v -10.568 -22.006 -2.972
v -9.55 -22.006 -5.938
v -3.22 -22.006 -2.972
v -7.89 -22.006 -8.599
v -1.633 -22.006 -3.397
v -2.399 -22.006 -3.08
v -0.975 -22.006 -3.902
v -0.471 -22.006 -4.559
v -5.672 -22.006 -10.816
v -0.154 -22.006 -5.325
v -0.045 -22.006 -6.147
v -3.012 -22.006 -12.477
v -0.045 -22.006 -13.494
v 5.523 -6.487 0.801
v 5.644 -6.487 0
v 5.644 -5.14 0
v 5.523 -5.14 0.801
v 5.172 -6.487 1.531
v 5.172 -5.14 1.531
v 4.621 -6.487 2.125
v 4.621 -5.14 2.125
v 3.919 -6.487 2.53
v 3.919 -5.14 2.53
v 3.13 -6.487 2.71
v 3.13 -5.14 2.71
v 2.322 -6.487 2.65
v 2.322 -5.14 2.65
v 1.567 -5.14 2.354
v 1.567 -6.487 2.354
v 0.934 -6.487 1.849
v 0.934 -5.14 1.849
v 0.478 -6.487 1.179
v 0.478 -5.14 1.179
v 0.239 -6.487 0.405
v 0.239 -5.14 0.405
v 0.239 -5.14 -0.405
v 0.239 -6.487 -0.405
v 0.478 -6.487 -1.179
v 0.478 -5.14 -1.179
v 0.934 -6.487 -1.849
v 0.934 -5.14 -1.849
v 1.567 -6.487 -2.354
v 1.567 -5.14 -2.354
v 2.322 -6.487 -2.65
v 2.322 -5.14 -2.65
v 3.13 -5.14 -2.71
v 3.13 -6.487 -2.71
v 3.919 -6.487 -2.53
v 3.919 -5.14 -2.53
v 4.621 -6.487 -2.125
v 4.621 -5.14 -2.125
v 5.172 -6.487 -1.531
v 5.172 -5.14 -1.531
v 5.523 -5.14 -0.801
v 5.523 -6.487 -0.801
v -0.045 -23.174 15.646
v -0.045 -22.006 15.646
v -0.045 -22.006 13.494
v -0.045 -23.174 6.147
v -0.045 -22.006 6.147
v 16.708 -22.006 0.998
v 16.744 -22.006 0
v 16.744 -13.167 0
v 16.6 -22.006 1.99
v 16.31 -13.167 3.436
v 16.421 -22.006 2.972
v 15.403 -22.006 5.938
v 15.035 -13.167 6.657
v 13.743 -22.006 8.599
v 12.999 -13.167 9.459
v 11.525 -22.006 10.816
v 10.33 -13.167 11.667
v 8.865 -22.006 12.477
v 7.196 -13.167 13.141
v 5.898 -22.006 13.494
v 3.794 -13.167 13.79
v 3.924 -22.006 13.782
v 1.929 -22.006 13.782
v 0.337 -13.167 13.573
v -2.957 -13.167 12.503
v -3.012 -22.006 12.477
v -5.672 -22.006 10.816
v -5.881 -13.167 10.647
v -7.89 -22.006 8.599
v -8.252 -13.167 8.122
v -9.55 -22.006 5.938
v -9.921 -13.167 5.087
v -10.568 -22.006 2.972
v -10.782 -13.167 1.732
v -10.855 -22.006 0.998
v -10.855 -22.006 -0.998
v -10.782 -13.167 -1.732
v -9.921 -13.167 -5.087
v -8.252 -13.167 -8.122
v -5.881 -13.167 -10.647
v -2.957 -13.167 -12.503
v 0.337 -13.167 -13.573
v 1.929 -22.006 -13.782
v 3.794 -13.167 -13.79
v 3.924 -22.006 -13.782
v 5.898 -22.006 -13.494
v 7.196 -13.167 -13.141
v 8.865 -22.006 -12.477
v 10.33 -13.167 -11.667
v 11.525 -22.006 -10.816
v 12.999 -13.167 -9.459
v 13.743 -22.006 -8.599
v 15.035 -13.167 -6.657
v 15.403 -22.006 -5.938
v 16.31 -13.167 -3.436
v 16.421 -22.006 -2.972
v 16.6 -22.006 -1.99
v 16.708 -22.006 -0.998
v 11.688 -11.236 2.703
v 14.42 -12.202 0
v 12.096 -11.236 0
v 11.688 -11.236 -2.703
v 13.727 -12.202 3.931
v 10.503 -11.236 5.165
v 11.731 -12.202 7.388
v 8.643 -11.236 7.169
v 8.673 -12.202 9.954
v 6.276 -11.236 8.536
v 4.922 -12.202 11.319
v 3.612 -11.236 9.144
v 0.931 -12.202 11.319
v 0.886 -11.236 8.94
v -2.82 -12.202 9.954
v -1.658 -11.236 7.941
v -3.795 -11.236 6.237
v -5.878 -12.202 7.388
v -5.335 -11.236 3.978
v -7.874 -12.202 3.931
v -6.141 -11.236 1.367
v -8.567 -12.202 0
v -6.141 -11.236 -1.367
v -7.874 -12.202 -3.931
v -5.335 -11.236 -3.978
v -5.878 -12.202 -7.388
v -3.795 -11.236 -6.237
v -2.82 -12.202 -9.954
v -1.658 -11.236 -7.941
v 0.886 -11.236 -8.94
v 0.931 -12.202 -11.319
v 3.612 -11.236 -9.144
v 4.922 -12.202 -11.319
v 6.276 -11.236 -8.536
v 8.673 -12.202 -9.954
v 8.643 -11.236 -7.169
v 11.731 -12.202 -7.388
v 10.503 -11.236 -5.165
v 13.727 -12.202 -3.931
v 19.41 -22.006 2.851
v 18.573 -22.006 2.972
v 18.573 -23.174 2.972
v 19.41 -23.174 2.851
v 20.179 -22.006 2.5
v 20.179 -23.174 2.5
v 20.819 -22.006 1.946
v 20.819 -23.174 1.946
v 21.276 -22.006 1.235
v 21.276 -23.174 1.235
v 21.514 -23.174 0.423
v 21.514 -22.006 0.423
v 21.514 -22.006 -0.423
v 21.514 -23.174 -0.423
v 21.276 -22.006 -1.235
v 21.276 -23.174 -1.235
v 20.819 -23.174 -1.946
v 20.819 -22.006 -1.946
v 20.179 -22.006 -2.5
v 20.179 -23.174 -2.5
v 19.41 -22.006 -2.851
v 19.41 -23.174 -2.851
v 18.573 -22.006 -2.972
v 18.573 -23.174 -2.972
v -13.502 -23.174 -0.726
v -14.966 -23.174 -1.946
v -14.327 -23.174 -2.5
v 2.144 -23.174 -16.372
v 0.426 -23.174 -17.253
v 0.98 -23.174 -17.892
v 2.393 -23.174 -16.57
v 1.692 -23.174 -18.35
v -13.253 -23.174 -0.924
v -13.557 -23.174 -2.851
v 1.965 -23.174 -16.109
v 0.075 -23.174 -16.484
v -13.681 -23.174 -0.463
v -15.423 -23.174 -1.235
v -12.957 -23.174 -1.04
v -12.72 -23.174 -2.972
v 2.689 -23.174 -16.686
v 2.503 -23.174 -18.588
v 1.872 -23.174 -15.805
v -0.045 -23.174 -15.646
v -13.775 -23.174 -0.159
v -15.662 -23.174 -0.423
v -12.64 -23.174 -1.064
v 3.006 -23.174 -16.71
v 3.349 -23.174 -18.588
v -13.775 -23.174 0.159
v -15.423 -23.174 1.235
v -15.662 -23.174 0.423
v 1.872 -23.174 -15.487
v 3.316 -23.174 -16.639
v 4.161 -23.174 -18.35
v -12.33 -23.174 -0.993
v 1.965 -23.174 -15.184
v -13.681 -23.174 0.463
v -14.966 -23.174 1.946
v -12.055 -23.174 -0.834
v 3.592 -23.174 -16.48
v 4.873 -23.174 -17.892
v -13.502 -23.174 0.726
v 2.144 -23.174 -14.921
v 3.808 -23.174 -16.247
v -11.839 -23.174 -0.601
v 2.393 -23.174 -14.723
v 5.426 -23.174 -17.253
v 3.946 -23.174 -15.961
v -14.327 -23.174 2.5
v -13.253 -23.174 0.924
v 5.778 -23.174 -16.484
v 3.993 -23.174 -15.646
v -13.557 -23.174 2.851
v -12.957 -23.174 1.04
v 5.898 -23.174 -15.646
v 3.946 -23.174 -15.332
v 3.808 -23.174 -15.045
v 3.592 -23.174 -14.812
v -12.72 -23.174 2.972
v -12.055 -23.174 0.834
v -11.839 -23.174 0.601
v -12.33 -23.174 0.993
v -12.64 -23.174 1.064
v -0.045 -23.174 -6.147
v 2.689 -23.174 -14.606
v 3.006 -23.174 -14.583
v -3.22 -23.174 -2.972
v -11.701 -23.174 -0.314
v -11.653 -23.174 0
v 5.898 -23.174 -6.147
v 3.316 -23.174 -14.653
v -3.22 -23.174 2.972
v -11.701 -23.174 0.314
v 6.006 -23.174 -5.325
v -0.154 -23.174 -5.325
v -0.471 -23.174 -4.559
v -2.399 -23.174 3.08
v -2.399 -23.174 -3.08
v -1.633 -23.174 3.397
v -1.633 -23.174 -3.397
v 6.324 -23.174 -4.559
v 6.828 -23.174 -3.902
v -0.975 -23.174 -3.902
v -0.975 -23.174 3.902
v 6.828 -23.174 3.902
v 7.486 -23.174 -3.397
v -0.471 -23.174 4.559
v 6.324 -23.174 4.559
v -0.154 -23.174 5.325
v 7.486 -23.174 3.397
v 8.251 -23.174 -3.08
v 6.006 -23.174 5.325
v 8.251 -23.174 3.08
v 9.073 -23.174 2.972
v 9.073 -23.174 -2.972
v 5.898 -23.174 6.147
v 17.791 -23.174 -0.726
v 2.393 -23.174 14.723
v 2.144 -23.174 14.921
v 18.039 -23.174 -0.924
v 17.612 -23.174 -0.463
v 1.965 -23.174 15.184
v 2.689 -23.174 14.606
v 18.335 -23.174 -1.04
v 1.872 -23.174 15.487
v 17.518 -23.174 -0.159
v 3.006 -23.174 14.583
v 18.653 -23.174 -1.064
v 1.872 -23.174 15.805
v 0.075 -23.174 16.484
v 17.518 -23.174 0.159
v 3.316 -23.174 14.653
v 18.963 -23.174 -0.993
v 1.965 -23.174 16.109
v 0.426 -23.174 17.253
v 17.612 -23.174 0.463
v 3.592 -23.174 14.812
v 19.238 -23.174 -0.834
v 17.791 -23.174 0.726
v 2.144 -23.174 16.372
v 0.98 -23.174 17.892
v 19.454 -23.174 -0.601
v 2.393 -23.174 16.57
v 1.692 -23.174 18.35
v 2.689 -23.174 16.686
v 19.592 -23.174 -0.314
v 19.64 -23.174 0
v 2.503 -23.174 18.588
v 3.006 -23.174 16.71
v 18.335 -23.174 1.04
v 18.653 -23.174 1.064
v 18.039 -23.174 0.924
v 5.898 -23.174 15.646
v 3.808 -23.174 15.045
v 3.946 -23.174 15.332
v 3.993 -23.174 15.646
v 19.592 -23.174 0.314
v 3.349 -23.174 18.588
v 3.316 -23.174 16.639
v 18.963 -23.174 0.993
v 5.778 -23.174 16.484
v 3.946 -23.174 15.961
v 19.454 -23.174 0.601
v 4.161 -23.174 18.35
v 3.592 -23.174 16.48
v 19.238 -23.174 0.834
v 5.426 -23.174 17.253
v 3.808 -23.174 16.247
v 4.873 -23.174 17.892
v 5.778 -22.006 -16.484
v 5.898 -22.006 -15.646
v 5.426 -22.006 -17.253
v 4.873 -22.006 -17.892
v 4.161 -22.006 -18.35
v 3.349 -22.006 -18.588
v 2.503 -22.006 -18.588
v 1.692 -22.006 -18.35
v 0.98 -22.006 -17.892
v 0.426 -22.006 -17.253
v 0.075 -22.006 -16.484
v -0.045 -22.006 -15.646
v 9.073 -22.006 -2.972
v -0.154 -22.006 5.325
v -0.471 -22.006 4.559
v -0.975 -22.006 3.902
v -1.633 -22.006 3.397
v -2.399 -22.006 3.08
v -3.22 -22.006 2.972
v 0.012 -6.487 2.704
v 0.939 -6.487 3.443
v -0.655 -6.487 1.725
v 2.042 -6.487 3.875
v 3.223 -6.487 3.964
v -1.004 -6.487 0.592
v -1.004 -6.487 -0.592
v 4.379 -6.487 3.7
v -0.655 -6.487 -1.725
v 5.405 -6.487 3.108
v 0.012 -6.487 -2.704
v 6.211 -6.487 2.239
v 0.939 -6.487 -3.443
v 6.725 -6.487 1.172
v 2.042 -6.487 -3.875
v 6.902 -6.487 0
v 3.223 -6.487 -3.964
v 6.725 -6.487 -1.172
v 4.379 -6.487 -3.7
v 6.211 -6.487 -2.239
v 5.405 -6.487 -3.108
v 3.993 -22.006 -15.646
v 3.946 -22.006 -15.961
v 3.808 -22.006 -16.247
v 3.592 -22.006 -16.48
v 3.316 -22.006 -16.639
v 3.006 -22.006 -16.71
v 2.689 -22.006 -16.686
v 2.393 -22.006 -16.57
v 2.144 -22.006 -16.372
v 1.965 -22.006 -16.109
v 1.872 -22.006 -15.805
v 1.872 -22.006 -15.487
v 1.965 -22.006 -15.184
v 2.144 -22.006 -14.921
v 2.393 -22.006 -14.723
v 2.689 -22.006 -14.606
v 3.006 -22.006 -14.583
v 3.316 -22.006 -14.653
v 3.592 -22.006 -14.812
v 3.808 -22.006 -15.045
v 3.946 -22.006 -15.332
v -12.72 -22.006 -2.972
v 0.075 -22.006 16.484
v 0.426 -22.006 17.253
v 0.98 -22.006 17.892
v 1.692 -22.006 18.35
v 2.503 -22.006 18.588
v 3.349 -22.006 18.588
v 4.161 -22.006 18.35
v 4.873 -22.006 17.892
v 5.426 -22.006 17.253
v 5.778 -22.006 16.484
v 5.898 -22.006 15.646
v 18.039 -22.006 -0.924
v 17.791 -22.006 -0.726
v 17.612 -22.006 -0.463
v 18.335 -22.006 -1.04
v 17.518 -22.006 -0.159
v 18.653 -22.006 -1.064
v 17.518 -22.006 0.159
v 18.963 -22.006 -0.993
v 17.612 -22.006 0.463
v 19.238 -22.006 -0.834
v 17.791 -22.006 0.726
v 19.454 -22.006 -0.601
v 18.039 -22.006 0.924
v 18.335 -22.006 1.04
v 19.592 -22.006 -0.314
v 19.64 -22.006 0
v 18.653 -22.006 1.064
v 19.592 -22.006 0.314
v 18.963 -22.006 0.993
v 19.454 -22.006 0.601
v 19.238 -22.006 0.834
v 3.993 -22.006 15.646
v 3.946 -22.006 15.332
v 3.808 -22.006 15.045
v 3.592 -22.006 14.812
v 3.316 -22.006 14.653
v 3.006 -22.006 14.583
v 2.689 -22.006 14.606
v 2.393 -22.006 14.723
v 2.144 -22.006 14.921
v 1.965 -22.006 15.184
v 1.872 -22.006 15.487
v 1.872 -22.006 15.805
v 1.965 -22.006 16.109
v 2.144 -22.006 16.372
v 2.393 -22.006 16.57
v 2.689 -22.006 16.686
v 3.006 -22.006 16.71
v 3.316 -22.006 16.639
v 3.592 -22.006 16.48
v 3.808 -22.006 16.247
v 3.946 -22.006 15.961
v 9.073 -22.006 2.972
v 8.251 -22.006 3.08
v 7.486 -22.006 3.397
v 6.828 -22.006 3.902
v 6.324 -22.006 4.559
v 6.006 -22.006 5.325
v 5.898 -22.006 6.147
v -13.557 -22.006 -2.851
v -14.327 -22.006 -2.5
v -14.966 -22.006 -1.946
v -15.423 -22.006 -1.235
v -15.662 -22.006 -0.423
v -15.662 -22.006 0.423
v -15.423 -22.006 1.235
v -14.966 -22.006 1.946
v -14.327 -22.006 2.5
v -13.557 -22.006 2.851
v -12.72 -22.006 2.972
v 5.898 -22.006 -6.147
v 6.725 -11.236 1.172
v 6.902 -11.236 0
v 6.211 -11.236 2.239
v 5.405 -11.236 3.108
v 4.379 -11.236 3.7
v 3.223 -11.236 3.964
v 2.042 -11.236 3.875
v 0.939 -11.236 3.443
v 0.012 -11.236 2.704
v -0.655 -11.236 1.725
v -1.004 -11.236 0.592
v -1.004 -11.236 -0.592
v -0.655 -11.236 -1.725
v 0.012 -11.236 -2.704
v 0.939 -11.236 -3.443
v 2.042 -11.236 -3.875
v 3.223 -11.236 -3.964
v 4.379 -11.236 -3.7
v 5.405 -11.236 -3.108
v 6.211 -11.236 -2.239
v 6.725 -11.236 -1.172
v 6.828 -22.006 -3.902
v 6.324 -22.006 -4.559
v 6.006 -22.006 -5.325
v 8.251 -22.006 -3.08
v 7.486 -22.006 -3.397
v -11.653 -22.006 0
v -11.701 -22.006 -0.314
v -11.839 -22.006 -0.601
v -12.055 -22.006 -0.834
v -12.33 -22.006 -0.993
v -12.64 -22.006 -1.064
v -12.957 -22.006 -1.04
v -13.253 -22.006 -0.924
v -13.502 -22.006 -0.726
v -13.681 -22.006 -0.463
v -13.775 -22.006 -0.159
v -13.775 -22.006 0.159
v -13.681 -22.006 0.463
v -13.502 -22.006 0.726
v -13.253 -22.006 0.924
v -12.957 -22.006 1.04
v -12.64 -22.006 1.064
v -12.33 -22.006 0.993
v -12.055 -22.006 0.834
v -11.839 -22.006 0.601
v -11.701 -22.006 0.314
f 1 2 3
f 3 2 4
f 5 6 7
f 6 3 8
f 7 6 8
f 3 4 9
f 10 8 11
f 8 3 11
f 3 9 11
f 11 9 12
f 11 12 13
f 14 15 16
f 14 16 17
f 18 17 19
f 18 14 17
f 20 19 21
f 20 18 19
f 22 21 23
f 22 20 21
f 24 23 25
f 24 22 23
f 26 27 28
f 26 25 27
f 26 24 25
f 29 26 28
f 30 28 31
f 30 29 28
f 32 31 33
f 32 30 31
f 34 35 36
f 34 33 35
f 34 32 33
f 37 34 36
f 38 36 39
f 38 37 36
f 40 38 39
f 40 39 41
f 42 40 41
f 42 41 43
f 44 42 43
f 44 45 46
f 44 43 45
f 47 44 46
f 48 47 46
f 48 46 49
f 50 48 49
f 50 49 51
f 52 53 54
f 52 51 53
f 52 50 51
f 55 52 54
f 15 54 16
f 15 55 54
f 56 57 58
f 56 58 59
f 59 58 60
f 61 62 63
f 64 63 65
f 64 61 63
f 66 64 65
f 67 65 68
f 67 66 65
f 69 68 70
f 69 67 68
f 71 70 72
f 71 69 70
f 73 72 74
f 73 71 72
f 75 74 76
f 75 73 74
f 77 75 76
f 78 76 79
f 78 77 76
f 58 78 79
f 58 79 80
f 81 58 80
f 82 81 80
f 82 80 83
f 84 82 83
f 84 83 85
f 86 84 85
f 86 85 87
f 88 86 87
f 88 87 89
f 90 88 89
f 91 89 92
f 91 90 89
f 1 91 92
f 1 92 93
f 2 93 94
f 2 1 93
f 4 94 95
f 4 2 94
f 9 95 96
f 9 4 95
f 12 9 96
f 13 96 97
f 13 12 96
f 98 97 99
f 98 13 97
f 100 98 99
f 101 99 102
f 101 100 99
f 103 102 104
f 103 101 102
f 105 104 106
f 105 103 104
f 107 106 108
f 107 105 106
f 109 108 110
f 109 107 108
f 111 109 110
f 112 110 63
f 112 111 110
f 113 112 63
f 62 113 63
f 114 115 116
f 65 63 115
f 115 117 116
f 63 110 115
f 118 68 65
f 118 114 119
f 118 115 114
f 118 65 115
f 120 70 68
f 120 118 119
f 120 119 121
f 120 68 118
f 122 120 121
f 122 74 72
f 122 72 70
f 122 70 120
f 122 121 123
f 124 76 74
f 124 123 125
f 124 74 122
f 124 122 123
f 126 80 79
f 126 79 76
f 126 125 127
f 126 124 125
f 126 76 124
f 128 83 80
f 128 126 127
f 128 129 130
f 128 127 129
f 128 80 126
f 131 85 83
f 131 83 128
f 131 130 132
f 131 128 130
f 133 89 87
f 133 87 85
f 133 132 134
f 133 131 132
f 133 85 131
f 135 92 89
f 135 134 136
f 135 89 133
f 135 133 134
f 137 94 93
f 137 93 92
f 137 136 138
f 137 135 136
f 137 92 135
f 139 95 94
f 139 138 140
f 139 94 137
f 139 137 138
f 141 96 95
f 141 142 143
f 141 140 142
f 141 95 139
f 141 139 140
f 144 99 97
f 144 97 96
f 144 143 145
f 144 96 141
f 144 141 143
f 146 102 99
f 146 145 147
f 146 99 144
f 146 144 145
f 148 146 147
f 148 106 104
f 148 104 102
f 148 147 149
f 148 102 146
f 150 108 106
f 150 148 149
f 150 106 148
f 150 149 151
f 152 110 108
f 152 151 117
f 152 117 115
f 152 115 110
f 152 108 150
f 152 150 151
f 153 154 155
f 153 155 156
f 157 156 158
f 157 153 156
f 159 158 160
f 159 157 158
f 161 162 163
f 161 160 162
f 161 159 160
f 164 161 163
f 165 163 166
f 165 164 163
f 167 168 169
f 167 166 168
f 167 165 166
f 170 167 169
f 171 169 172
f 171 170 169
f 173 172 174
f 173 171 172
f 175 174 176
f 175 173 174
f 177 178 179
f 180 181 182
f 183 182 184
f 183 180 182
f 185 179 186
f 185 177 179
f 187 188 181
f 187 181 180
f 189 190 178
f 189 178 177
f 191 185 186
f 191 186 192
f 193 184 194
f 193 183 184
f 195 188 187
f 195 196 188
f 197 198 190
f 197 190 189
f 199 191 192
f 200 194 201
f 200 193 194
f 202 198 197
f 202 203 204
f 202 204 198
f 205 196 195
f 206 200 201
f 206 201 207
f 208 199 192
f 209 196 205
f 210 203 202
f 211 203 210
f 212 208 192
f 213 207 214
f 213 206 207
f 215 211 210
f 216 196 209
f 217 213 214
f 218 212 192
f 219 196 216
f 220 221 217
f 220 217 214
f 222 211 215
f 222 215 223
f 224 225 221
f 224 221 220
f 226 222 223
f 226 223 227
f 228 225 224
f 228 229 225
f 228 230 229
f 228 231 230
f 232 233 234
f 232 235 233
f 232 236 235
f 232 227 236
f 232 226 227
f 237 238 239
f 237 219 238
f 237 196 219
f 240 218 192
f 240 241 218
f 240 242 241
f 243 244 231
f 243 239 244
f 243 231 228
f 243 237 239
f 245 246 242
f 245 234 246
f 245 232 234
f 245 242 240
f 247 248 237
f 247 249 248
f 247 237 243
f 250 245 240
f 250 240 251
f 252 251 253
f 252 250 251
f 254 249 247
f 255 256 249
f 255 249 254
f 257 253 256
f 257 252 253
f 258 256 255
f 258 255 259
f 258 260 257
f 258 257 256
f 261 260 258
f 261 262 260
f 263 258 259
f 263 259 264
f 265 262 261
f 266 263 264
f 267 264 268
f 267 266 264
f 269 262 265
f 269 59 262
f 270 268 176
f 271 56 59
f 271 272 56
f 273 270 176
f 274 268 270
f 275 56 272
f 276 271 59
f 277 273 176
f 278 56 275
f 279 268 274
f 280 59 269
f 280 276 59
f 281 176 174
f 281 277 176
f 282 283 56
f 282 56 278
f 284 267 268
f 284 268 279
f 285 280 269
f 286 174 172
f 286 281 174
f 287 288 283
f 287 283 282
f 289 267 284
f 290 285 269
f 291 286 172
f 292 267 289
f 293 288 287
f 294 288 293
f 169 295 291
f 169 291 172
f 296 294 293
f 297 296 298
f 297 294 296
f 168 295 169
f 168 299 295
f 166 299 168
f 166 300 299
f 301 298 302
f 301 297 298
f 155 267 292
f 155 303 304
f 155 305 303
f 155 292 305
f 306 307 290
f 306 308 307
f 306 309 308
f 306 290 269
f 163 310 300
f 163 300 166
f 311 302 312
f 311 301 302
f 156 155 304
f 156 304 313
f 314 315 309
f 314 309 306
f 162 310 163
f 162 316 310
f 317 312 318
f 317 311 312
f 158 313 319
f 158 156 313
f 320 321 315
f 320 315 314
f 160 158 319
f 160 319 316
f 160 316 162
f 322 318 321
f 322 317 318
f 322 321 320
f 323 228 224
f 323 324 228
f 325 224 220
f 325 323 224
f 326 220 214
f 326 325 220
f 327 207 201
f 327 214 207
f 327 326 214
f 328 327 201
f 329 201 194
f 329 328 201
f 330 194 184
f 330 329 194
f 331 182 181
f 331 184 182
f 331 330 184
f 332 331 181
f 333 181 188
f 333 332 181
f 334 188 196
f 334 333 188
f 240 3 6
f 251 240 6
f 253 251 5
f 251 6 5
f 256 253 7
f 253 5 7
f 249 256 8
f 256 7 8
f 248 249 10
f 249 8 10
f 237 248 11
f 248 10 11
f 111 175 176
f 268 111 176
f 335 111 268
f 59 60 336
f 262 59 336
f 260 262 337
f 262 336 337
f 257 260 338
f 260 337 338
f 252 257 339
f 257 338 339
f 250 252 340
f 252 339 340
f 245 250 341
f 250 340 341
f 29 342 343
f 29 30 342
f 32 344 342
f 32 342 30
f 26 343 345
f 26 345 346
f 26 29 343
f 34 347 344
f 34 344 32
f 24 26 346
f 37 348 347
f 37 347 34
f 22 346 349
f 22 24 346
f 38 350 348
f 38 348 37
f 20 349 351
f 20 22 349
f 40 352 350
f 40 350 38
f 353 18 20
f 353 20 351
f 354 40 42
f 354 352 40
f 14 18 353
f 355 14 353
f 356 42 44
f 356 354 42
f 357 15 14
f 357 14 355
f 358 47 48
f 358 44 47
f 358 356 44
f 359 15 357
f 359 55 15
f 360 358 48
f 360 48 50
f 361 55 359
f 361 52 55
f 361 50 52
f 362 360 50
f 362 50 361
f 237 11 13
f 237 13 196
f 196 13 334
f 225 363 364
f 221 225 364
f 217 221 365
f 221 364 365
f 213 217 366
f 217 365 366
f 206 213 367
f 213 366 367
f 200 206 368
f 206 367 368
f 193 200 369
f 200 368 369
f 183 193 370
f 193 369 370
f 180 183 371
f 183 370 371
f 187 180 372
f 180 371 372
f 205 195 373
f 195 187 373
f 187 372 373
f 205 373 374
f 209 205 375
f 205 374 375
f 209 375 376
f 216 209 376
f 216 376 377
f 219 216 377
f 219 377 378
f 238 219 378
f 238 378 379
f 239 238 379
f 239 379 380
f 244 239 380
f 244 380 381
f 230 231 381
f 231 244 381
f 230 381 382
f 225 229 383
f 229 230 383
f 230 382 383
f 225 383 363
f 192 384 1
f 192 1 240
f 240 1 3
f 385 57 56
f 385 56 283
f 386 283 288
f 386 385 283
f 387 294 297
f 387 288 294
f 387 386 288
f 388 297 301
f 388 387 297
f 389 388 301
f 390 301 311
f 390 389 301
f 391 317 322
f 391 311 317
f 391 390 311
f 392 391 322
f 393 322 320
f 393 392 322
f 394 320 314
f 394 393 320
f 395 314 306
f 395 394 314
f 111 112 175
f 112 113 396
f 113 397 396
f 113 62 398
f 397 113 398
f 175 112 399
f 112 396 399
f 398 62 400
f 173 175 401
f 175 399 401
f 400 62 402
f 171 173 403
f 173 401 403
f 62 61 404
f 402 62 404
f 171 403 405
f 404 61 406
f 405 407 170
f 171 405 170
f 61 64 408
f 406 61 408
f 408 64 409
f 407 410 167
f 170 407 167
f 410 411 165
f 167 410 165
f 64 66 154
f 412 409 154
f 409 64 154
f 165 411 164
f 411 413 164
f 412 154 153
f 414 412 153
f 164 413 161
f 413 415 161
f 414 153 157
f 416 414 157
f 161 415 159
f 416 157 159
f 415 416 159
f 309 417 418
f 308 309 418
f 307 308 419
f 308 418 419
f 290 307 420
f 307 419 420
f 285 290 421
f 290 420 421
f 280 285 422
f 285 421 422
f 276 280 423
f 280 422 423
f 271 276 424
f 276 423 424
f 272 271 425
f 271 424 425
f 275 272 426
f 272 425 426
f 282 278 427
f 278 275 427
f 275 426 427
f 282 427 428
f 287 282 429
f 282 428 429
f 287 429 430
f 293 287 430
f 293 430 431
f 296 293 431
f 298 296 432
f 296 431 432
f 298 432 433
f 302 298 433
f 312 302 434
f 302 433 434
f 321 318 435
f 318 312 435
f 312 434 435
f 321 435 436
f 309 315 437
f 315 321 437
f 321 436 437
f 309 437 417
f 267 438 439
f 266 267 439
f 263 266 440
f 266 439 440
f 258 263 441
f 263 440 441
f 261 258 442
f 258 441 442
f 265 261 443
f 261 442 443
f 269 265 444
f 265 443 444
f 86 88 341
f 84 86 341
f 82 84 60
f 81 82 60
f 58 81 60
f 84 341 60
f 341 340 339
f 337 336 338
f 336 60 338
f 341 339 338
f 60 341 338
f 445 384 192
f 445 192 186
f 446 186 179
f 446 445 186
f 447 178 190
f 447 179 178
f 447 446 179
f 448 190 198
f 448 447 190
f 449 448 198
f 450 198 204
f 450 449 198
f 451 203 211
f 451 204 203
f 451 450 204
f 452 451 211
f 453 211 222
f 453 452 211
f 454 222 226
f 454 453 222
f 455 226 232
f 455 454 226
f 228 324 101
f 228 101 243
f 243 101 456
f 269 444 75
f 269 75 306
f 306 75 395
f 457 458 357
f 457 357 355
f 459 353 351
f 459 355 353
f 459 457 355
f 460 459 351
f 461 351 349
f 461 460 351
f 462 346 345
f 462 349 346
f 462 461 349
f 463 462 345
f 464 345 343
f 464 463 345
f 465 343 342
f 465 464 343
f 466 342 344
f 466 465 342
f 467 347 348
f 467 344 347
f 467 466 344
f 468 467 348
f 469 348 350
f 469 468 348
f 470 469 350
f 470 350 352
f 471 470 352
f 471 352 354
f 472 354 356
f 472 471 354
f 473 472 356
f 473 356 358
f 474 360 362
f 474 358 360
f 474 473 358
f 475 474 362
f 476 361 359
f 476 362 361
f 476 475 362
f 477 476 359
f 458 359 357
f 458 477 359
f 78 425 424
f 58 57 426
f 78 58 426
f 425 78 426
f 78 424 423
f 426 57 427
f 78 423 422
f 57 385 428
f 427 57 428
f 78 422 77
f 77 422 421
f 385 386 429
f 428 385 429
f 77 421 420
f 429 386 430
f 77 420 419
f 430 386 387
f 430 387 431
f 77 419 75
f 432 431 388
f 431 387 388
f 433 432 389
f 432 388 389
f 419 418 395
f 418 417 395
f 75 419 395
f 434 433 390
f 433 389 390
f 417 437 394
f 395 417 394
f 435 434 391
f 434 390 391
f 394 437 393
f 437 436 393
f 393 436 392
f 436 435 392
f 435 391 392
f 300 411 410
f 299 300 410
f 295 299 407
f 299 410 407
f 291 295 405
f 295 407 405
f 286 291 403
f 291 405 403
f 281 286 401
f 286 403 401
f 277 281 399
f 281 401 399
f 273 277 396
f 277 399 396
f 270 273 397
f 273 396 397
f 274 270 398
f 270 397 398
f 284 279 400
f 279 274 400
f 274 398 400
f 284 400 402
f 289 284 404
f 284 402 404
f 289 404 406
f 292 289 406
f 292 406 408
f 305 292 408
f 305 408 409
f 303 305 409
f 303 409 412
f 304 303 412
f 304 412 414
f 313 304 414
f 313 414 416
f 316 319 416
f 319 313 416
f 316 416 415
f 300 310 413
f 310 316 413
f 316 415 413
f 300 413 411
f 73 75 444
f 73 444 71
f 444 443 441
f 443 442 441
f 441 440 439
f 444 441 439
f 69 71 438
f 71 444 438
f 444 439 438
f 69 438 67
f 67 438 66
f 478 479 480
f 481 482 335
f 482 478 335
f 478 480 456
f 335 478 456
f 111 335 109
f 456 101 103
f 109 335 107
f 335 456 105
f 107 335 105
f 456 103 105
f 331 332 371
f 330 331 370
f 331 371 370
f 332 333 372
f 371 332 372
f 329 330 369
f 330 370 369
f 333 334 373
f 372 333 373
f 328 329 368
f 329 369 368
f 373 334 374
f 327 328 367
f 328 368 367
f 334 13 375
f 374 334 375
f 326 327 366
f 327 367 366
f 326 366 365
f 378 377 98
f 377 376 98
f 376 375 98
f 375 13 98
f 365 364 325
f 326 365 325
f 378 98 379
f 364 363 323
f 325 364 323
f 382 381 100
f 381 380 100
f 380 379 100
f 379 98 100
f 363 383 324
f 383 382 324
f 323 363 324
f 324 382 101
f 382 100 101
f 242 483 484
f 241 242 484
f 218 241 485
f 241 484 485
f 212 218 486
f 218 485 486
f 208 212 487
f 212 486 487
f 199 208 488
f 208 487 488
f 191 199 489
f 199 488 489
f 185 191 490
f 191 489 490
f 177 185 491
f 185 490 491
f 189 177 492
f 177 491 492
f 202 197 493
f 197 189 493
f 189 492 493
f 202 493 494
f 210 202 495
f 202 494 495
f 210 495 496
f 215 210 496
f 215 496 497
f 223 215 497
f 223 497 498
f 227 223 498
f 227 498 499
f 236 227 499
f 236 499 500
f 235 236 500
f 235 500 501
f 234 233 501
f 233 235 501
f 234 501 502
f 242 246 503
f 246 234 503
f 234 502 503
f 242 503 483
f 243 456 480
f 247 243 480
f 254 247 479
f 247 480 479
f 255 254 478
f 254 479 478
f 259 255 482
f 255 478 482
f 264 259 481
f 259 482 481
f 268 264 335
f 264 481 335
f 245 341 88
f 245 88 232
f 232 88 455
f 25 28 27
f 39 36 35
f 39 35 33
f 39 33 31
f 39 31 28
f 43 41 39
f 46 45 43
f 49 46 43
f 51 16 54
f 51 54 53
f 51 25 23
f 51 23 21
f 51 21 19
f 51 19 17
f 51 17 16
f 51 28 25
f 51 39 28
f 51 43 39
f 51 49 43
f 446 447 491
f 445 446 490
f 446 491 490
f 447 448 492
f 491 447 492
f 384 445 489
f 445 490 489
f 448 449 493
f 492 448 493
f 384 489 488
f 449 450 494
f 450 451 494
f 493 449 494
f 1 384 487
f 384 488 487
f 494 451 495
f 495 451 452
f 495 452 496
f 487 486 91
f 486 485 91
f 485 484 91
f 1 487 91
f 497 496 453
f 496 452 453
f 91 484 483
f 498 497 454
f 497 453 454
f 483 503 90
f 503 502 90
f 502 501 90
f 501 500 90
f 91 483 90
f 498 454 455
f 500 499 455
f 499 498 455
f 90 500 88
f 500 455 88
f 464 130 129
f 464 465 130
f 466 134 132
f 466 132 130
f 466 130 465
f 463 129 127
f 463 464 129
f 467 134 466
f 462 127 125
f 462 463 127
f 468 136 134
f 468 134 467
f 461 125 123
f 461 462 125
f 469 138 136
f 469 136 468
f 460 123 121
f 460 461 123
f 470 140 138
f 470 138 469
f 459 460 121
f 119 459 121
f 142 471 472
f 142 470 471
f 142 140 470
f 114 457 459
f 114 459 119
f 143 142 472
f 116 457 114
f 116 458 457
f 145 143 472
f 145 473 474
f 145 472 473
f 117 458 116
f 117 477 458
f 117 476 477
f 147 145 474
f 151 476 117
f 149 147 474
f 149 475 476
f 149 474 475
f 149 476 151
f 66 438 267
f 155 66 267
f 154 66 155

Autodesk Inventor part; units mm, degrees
ref_plane "YZ Plane" through (0, 0, 0) normal (1, 0, 0) x (0, 1, 0)
ref_plane "XZ Plane" through (0, 0, 0) normal (0, 1, 0) x (-1, 0, 0)
ref_plane "XY Plane" through (0, 0, 0) normal (0, 0, 1) x (1, 0, 0)
sketch "Sketch1" plane through (0, 0, 0) normal (0, 0, 1) x (1, 0, 0)
  line L0 (2.9264, -5.1404) -> (5.6442, -5.1404)
  line L1 (5.6442, -5.1404) -> (5.6442, -6.4866)
  line L2 (5.6442, -6.4866) -> (6.9015, -6.4866)
  line L3 (6.9015, -6.4866) -> (6.9015, -11.2364)
  line L4 (6.9015, -11.2364) -> (12.0958, -11.2364)
  line L5 (12.0958, -11.2364) -> (16.744, -13.1668)
  line L6 (16.744, -13.1668) -> (16.744, -22.006)
  line L7 (16.744, -22.006) -> (2.9264, -22.006)
  line L8 (2.9264, -22.006) -> (2.9264, -5.1404)
  point P0 (0, 0)
  dimension "d0" = 10.7696
  dimension "d1" = 8.8392
  dimension "d2" = 4.6482
  dimension "d3" = 13.8176
  dimension "d4" = 16.8656
  dimension "d5" = 1.3462
  dimension "d6" = 2.7178
  dimension "d7" = 3.9751
revolve "Revolution1" add sketch "Sketch1" angle 360 about axis through (2.9264, -22.006, 0) along (0, 1, 0)
sketch "Sketch2" plane through (2.9264, -22.006, 0) normal (0, -1, 0) x (1, 0, 0)
  circle A0 centre (0, 0) radius 13.8176 projected
  line L0 (6.1468, 2.9718) -> (15.6464, 2.9718)
  line L1 (18.6182, 0) -> (18.6182, 0)
  line L2 (15.6464, -2.9718) -> (6.1468, -2.9718)
  line L3 (2.9718, 6.1468) -> (2.9718, 15.6464)
  line L4 (0, 18.6182) -> (0, 18.6182)
  line L5 (-2.9718, 15.6464) -> (-2.9718, 6.1468)
  line L6 (-6.1468, 2.9718) -> (-15.6464, 2.9718)
  line L7 (-18.6182, 0) -> (-18.6182, 0)
  line L8 (-15.6464, -2.9718) -> (-6.1468, -2.9718)
  line L9 (-2.9718, -6.1468) -> (-2.9718, -15.6464)
  line L10 (0, -18.6182) -> (0, -18.6182)
  line L11 (2.9718, -15.6464) -> (2.9718, -6.1468)
  arc A1 (-6.1468, 2.9718) -> (-2.9718, 6.1468) centre (-6.1468, 6.1468) ccw
  arc A2 (2.9718, 6.1468) -> (6.1468, 2.9718) centre (6.1468, 6.1468) ccw
  arc A3 (6.1468, -2.9718) -> (2.9718, -6.1468) centre (6.1468, -6.1468) ccw
  arc A4 (-2.9718, -6.1468) -> (-6.1468, -2.9718) centre (-6.1468, -6.1468) ccw
  arc A5 (18.6182, 0) -> (15.6464, 2.9718) centre (15.6464, 0) ccw
  arc A6 (15.6464, -2.9718) -> (18.6182, 0) centre (15.6464, 0) ccw
  arc A7 (2.9718, 15.6464) -> (0, 18.6182) centre (0, 15.6464) ccw
  arc A8 (0, 18.6182) -> (-2.9718, 15.6464) centre (0, 15.6464) ccw
  arc A9 (-15.6464, 2.9718) -> (-18.6182, 0) centre (-15.6464, 0) ccw
  arc A10 (-18.6182, 0) -> (-15.6464, -2.9718) centre (-15.6464, 0) ccw
  arc A11 (-2.9718, -15.6464) -> (0, -18.6182) centre (0, -15.6464) ccw
  arc A12 (0, -18.6182) -> (2.9718, -15.6464) centre (0, -15.6464) ccw
  circle A13 centre (0, 15.6464) radius 1.0668
  circle A14 centre (15.6464, 0) radius 1.0668
  circle A15 centre (-15.6464, 0) radius 1.0668
  circle A16 centre (0, -15.6464) radius 1.0668
  point P0 (-2.9264, 0)
  dimension "d9" = 3.175
  dimension "d10" = 5.9436
  dimension "d11" = 2.9718
  dimension "d12" = 5.9436
  dimension "d13" = 15.6464
  dimension "d14" = 15.6464
  dimension "d15" = 15.6464
  dimension "d16" = 2.1336
extrude "Extrusion1" add sketch "Sketch2" along normal blind 1.1684 contours A0 L2 A3 L11 L9 A4 L8 L6 A1 L5 L3 A2 L0 | A0 L0 A5 A6 L2 | A0 L5 A8 A7 L3 | L11 A12 A11 L9 A0 | A0 L8 A10 A9 L6
equation "\"d12\" = d10"
equation "\"d14\" = d13"
equation "\"d15\" = d13"
properties part number "Lift_Motor"
